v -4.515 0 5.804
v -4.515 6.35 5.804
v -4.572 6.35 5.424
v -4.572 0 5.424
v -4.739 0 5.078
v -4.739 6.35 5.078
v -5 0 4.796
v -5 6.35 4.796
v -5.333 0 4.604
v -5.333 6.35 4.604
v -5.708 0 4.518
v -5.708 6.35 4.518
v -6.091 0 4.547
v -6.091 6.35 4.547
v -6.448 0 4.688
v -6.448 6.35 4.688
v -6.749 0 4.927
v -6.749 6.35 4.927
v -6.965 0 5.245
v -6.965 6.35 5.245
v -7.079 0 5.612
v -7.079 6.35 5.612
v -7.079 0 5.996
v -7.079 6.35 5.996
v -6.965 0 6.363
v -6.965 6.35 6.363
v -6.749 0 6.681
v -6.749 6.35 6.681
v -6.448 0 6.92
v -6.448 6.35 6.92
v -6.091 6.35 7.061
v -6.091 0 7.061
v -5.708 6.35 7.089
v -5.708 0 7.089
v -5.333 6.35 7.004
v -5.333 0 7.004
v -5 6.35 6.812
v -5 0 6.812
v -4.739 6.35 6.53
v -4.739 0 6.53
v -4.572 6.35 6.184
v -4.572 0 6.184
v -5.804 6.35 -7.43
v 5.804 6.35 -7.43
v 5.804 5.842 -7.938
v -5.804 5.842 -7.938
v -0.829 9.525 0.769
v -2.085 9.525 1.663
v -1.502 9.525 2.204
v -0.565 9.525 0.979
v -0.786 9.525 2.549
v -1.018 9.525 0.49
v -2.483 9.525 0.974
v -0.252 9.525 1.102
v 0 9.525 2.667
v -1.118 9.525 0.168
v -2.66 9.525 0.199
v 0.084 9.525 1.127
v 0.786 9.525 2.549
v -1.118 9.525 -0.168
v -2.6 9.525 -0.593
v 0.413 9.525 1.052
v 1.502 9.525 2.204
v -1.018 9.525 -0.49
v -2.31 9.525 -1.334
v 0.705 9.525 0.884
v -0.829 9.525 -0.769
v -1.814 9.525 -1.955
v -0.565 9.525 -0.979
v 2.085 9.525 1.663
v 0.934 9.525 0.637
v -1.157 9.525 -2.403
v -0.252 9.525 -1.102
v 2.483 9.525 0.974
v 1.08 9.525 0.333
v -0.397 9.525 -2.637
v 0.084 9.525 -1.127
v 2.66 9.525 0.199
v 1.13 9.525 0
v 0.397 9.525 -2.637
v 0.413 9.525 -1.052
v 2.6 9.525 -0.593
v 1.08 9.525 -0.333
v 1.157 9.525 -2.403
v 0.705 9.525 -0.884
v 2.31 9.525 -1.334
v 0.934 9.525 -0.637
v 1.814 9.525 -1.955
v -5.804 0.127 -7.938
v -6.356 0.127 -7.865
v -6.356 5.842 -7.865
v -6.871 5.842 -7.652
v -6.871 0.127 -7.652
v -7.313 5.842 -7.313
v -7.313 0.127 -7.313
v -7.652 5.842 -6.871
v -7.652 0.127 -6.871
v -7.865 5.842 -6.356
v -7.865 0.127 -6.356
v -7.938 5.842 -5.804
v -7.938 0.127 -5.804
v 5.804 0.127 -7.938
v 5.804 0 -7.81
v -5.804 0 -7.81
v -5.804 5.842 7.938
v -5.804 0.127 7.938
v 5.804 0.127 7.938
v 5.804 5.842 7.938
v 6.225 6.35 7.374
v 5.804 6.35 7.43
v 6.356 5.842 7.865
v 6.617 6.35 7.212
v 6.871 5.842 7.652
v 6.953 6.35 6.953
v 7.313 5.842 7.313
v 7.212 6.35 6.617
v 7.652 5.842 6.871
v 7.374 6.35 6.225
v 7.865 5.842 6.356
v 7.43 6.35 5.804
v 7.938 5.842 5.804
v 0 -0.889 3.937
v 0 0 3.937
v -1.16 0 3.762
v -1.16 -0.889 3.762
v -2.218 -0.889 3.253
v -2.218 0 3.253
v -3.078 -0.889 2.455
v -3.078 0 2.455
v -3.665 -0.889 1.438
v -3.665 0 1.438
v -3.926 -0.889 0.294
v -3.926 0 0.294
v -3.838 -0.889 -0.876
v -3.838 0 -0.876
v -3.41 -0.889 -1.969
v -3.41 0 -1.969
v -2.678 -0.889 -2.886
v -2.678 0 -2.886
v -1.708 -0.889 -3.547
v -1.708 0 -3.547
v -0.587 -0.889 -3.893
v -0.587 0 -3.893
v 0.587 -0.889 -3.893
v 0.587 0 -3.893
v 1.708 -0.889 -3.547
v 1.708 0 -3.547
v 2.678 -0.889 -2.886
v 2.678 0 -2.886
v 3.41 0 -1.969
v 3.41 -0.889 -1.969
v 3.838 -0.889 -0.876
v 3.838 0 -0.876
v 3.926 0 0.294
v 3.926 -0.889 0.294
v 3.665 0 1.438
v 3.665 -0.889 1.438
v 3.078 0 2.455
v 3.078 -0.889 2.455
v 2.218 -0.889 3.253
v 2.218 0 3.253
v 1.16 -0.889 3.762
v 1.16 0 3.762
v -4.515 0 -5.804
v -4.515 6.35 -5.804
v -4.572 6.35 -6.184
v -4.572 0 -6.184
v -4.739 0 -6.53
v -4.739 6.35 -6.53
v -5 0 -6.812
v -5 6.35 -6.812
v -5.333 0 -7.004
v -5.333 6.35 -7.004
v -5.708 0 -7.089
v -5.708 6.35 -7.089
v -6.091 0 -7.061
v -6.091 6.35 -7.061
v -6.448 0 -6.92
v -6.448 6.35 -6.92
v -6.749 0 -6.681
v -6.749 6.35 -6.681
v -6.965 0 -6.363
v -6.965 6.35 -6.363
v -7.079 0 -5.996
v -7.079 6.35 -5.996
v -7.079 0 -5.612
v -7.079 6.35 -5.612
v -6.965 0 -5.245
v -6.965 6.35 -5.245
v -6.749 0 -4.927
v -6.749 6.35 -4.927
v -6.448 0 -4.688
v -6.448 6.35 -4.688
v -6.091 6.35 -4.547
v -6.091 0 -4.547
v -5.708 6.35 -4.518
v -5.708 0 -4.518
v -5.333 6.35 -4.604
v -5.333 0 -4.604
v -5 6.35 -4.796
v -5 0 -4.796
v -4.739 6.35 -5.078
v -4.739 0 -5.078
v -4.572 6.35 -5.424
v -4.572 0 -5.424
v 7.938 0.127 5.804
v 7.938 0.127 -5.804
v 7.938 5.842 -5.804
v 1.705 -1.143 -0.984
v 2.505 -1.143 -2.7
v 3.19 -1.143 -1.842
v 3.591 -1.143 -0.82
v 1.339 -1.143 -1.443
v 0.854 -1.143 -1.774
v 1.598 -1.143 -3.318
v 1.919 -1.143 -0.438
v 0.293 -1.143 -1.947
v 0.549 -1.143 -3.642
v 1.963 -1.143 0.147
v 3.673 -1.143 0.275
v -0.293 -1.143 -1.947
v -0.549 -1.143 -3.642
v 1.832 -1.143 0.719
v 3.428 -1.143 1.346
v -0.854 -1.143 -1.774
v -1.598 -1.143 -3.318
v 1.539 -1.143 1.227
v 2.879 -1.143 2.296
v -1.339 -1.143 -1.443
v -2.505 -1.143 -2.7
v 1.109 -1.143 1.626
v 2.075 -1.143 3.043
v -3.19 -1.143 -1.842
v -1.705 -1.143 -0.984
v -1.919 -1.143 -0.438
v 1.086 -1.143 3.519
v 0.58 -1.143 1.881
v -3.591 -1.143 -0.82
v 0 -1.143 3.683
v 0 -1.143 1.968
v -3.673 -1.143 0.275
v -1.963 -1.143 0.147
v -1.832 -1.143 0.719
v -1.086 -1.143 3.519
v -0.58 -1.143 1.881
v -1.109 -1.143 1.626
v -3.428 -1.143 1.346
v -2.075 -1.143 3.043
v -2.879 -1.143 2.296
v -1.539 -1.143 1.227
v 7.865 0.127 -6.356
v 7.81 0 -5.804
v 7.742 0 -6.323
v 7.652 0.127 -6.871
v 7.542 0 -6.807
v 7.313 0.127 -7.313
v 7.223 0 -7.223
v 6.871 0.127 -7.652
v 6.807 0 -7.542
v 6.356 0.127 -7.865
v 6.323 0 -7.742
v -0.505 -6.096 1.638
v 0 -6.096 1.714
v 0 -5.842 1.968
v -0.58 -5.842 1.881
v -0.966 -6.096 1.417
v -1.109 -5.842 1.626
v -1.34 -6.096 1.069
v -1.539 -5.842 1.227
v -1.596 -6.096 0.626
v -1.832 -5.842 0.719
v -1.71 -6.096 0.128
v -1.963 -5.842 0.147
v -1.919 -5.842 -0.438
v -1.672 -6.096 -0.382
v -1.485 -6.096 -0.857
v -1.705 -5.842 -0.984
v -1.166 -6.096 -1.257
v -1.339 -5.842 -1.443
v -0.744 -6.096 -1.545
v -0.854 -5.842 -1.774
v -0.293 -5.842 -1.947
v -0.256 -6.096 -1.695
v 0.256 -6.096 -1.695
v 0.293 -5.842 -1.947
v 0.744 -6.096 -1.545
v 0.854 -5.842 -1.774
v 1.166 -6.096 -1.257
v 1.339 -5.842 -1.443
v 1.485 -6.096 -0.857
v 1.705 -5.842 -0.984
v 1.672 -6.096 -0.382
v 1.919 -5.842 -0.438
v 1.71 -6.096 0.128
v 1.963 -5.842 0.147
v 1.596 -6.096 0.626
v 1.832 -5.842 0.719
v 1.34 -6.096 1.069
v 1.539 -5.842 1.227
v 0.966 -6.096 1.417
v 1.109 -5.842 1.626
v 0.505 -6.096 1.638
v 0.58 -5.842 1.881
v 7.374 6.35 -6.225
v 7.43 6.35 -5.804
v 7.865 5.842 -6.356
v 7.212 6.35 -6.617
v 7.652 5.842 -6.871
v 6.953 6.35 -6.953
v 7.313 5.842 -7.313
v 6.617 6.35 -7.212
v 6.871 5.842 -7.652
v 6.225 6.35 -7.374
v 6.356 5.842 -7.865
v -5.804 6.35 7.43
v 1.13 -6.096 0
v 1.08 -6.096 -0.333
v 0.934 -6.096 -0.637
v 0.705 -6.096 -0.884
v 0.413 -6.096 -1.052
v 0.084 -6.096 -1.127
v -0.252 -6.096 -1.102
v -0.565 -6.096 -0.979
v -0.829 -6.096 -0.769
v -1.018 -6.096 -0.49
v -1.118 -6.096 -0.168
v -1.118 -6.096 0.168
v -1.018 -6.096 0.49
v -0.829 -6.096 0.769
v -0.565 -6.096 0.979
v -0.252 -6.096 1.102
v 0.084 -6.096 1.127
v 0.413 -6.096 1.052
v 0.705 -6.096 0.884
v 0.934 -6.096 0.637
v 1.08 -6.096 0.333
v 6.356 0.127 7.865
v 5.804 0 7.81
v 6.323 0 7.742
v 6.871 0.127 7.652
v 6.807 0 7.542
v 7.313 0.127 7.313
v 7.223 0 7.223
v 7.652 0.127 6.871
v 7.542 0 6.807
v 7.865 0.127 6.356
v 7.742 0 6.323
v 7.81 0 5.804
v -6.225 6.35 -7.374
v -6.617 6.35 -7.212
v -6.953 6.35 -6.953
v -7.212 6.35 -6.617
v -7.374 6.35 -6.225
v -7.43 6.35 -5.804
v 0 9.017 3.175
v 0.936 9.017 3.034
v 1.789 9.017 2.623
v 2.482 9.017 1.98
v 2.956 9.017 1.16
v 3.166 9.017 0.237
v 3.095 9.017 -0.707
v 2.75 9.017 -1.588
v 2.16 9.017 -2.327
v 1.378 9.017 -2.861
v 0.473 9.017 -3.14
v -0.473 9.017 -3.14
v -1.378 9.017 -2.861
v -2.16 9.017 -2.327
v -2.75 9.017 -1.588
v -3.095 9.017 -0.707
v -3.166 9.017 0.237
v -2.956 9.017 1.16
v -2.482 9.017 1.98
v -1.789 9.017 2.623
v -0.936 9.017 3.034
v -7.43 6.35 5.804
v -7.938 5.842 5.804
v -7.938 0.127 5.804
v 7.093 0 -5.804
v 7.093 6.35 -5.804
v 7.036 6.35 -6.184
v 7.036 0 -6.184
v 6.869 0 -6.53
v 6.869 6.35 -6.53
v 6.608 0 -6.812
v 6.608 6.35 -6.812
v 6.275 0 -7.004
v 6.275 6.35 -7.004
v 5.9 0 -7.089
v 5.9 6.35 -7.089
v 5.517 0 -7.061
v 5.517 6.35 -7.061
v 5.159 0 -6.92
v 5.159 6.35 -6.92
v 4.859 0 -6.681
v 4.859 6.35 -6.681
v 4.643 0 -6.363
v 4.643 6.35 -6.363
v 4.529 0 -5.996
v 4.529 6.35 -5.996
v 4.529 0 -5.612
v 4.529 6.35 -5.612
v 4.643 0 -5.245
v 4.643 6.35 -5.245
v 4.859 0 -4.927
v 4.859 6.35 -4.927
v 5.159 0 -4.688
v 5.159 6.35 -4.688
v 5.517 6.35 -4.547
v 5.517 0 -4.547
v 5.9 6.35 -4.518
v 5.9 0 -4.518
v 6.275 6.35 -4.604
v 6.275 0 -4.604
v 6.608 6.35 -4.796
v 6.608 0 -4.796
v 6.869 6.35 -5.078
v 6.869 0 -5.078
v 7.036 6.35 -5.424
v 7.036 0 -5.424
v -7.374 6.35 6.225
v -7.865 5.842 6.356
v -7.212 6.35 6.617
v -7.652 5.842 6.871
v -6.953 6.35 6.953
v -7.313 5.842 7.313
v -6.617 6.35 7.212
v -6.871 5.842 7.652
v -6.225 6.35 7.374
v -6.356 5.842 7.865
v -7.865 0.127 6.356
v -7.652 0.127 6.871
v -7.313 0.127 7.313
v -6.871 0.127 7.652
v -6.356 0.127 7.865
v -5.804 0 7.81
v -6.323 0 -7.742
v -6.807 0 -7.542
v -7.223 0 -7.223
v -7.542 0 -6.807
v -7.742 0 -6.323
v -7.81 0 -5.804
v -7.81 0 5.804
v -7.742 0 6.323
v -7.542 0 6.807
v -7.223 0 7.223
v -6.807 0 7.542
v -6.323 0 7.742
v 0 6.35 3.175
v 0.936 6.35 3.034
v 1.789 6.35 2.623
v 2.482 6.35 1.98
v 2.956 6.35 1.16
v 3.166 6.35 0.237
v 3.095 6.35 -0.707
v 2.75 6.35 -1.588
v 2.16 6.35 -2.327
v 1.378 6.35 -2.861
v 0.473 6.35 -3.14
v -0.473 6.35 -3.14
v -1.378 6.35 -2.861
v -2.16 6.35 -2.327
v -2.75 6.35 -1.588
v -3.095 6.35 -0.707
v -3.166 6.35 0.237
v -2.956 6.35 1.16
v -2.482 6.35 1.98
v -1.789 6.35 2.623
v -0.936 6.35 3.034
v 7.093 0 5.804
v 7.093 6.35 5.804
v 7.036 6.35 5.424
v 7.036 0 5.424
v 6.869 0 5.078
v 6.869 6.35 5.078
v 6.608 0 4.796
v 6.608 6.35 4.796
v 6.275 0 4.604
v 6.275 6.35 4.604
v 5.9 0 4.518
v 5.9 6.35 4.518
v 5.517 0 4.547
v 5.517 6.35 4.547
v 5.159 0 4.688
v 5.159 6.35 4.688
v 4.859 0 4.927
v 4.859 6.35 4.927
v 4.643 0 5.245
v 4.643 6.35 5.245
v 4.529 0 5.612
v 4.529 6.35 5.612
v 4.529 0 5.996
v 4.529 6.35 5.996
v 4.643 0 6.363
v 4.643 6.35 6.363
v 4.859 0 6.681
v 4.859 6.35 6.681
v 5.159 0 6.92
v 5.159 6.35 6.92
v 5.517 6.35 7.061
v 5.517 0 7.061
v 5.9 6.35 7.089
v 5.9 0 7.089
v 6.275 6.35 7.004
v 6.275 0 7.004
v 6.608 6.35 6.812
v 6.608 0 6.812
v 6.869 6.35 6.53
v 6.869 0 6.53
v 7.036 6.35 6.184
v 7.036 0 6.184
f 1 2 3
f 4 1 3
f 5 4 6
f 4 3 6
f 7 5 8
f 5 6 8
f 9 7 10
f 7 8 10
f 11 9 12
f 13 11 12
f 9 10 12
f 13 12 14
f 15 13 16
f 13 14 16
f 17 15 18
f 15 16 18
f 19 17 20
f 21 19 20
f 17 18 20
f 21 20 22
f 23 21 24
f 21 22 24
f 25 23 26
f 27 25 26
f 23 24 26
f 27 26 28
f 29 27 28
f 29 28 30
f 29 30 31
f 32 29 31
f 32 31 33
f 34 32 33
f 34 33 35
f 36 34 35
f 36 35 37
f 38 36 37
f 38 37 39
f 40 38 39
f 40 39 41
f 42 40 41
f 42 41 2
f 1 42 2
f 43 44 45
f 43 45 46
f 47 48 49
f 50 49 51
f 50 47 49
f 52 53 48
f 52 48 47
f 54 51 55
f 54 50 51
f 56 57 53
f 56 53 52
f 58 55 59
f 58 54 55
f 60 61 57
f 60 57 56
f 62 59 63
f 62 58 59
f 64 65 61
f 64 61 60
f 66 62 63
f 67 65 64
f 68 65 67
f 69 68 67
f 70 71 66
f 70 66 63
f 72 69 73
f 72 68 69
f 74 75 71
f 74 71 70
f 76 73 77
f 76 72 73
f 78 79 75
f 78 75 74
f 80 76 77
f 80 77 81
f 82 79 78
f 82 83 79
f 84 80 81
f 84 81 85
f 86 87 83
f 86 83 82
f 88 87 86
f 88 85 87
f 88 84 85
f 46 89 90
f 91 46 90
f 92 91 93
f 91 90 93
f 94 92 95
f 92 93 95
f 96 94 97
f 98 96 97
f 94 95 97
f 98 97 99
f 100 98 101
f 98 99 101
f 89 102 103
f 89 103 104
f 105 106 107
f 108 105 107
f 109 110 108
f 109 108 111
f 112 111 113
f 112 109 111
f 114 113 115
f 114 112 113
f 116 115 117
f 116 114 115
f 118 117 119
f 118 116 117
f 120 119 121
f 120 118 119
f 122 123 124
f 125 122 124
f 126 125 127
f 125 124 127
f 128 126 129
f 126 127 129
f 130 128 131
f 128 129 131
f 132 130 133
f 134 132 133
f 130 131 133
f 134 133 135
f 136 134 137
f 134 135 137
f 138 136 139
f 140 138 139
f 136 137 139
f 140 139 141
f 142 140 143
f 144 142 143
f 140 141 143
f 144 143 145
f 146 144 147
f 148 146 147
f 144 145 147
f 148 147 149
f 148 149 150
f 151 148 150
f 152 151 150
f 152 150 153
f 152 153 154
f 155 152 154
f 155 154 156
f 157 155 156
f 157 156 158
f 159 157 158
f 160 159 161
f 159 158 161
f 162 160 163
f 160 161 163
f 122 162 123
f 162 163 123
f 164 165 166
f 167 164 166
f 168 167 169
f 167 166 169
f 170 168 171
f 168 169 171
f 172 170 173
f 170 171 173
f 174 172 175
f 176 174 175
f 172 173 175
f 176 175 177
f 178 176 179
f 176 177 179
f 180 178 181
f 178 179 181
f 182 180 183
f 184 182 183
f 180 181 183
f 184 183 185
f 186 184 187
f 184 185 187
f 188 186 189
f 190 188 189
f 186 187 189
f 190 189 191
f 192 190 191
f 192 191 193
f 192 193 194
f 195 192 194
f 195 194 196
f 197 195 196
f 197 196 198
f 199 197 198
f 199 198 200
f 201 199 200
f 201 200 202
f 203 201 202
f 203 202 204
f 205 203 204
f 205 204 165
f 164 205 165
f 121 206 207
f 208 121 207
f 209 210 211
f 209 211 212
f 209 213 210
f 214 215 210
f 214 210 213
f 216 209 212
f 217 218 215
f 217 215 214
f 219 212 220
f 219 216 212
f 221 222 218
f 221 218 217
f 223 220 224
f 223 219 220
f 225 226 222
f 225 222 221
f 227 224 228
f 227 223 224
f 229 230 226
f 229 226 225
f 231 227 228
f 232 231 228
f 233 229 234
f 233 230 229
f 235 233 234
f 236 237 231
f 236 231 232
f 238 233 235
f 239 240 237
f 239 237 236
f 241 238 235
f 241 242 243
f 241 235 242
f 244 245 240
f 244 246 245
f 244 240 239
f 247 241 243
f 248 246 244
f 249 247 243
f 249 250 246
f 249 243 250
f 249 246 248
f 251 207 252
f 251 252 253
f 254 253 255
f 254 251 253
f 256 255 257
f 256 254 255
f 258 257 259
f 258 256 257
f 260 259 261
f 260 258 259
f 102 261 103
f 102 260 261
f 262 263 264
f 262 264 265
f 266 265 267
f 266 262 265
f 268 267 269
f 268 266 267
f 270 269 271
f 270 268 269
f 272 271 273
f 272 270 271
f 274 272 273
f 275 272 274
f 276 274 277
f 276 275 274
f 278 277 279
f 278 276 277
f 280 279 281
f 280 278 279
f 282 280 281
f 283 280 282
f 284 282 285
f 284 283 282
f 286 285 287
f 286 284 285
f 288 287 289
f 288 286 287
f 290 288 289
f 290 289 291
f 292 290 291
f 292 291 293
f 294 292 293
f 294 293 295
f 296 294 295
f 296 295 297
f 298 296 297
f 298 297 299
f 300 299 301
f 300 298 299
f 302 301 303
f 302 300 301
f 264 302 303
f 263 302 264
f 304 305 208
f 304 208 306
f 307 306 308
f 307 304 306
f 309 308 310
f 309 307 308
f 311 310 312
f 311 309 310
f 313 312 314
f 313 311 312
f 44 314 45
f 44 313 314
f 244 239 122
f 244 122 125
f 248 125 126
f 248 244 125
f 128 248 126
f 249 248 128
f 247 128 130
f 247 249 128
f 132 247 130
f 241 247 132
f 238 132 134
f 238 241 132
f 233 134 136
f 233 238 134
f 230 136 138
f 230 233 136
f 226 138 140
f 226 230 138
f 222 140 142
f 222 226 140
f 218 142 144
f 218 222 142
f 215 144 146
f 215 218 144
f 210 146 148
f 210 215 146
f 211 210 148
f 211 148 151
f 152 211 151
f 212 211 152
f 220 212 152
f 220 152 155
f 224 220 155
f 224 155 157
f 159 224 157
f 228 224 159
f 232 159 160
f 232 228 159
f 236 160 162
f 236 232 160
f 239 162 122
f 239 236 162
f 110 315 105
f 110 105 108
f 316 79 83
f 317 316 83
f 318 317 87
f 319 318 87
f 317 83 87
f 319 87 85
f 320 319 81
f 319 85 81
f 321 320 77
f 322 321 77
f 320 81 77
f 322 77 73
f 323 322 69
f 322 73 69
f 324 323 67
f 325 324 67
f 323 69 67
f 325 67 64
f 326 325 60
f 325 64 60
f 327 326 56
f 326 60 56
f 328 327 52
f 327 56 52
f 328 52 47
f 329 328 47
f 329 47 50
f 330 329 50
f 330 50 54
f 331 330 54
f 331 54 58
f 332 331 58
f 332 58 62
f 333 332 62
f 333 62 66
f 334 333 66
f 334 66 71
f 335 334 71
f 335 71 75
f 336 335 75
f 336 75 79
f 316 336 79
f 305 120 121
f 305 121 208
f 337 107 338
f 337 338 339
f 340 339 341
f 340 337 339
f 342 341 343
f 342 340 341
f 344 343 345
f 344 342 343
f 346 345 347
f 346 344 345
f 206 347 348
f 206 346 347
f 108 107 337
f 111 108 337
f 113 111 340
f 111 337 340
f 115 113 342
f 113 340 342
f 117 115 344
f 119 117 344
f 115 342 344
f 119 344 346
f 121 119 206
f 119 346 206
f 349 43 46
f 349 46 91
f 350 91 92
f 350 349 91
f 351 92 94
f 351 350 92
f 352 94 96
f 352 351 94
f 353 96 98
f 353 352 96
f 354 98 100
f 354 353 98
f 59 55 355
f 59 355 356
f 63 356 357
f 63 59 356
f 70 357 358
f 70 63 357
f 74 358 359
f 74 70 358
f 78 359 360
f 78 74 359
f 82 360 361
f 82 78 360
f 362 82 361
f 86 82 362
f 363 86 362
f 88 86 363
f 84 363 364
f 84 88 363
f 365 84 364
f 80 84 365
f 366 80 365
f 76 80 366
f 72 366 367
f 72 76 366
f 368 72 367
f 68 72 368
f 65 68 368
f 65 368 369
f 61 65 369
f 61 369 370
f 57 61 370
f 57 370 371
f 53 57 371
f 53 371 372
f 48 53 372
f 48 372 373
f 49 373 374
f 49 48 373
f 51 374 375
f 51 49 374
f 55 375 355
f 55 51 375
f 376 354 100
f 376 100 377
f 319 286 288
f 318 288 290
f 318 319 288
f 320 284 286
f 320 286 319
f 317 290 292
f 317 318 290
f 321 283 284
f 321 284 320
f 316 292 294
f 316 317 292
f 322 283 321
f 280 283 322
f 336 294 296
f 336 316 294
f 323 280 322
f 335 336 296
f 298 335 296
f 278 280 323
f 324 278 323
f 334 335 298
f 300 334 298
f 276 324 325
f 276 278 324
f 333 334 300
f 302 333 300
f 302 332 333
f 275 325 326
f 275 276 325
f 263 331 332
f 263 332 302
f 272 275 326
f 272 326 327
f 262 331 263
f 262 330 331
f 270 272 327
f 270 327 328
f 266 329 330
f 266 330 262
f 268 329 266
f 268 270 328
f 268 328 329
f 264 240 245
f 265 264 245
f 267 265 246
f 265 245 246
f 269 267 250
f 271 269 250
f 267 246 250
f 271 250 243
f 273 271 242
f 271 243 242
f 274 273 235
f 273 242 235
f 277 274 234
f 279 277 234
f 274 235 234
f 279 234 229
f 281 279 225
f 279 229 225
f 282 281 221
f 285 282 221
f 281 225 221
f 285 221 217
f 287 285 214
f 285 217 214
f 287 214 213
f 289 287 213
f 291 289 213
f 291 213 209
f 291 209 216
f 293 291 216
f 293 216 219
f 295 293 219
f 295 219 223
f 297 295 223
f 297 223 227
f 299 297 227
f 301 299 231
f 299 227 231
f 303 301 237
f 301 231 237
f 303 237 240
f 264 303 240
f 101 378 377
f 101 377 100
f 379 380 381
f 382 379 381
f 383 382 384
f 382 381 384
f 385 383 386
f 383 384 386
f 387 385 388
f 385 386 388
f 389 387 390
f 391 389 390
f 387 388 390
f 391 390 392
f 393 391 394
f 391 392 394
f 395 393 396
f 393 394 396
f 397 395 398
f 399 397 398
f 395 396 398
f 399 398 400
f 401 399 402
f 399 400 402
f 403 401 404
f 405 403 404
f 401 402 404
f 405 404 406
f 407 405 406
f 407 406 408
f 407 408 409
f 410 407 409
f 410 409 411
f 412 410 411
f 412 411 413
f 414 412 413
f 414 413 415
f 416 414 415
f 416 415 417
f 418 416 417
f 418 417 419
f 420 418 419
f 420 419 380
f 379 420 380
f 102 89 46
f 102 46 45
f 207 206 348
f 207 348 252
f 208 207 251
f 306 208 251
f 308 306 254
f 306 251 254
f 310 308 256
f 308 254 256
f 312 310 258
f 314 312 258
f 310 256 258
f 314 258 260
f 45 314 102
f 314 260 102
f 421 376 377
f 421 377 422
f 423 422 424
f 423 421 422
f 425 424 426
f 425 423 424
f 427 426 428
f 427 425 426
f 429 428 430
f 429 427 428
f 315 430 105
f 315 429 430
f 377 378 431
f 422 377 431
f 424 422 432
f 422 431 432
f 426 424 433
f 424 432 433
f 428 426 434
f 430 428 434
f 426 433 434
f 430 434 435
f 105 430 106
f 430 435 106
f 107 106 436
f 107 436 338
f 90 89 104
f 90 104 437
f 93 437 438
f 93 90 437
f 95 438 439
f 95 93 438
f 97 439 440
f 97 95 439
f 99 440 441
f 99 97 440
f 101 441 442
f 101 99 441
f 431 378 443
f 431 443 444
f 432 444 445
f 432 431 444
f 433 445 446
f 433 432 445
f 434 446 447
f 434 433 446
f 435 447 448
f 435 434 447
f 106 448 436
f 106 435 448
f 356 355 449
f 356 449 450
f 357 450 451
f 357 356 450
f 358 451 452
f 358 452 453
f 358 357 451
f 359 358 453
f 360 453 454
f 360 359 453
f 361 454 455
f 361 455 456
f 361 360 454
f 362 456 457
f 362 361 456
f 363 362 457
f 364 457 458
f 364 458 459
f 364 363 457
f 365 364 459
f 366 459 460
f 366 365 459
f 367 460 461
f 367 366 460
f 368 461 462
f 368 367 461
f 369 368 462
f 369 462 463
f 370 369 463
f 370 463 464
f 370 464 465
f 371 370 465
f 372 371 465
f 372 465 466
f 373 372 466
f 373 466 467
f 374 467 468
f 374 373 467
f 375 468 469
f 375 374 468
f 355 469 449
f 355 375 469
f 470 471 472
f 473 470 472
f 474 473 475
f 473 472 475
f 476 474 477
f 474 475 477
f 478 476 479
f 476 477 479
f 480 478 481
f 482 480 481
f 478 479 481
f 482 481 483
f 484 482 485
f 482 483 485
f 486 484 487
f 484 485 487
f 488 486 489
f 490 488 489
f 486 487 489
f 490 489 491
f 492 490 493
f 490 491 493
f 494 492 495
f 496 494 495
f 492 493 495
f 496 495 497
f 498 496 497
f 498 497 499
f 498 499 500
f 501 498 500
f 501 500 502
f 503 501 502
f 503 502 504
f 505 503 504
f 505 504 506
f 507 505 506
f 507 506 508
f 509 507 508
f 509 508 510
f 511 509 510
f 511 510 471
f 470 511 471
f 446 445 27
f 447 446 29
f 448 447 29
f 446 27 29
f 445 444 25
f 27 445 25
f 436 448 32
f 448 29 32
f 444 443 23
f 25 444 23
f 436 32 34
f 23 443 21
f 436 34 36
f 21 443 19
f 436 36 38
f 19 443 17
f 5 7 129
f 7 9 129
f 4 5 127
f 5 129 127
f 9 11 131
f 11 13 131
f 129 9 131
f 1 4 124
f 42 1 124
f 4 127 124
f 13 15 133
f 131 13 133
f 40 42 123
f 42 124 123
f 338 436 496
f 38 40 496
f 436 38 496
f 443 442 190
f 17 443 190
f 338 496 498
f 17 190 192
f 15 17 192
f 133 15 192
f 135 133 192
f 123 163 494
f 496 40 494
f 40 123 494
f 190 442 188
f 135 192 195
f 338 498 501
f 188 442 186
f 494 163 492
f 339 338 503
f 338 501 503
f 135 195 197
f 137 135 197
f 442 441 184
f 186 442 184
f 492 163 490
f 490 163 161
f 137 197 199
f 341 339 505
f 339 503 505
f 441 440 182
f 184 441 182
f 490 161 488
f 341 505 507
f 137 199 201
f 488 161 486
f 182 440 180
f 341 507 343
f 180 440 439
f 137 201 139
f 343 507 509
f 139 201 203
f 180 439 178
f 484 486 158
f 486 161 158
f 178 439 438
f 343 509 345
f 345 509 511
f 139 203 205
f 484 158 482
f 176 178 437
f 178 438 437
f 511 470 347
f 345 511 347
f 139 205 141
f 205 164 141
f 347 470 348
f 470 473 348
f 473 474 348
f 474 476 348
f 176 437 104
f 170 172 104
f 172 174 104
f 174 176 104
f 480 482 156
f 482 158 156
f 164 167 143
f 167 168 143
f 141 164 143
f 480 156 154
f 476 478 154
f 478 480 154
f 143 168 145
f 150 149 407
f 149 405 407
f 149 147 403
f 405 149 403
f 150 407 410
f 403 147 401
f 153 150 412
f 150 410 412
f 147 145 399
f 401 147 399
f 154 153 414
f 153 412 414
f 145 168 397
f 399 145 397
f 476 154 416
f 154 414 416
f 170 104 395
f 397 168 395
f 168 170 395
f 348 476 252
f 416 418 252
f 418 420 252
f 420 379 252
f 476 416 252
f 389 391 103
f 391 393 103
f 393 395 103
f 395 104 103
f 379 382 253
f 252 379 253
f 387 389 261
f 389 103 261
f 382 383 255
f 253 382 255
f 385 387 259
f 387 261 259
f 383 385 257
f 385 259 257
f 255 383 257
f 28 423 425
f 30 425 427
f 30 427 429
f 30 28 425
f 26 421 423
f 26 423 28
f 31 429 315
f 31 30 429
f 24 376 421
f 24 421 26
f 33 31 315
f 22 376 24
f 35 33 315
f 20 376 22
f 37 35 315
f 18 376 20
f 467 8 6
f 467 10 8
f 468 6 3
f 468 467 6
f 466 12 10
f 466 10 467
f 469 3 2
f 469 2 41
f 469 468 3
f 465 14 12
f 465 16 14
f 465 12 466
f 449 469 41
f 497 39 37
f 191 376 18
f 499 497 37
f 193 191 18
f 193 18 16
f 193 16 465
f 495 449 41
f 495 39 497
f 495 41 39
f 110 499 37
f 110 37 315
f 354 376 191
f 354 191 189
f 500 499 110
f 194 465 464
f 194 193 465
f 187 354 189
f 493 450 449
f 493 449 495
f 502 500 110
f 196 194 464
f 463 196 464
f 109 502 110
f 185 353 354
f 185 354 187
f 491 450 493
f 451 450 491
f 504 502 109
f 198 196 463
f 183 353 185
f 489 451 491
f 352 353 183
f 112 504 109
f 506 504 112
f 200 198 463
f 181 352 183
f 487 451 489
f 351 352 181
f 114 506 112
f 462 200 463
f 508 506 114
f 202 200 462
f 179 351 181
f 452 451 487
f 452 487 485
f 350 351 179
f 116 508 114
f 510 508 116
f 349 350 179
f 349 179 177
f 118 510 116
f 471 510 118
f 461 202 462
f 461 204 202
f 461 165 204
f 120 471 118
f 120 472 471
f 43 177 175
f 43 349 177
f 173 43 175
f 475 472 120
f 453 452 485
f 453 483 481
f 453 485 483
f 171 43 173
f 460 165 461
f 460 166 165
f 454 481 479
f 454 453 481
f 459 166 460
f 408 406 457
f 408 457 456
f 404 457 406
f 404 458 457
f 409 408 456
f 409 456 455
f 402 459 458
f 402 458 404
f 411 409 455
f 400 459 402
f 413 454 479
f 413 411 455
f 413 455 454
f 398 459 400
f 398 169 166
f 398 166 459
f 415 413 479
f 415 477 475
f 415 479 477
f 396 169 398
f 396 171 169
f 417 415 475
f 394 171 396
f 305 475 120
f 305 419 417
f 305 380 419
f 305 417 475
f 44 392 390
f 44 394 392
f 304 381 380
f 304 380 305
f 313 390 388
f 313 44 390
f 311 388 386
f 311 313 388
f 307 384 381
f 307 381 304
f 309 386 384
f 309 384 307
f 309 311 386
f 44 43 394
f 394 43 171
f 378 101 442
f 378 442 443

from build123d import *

# Parameters (mm, degrees)
SKETCH1_W             = 15.875
SKETCH1_H             = 15.875
BOSS_EXTRUDE1_DEPTH   = 9.525
F_5_40_TAPPED_HOLE1_D = 2.5781
SKETCH4_R             = 3.937
BOSS_EXTRUDE2_DEPTH   = 1.143
SKETCH10_R            = 1.9685
BOSS_EXTRUDE4_DEPTH   = 4.953
F_4_40_TAPPED_HOLE1_D = 2.2606
SKETCH9_OUTSIDE_W     = 23.345
SKETCH9_OUTSIDE_H     = 23.345
SKETCH9_OUTSIDE_R     = 3.175
CUT_EXTRUDE3_DEPTH    = 3.175
SKETCH11_OUTSIDE_W    = 23.345
SKETCH11_OUTSIDE_H    = 23.345
CUT_EXTRUDE4_DEPTH    = 15.721869362
CHAMFER1_SIZE         = 0.254
CHAMFER3_SIZE         = 0.508
CHAMFER4_SIZE         = 0.127


with BuildPart() as part:
    # Sketch1 → Boss-Extrude1 (new body)
    with BuildSketch(Plane(origin=(0, 0, 0), x_dir=(1, 0, 0), z_dir=(0, 1, 0))):
        Rectangle(SKETCH1_W, SKETCH1_H)
    extrude(amount=BOSS_EXTRUDE1_DEPTH)

    # #5-40 Tapped Hole1 (through all)
    with Locations(Plane(origin=(0, 0, 0), x_dir=(-1, 0, 0), z_dir=(0, -1, 0))):
        with Locations((-5.8039, -5.8039), (-5.8039, 5.8039), (5.8039, 5.8039), (5.8039, -5.8039)):
            Hole(F_5_40_TAPPED_HOLE1_D / 2)

    # Sketch4 → Boss-Extrude2 (add)
    with BuildSketch(Plane.XZ):
        with Locations(Location((0, 0, 0), (0, 0, 90))):
            Circle(SKETCH4_R)
    extrude(amount=BOSS_EXTRUDE2_DEPTH)

    # Sketch10 → Boss-Extrude4 (add)
    with BuildSketch(Plane.XZ.offset(1.143)):
        with Locations(Location((0, 0, 0), (0, 0, 90))):
            Circle(SKETCH10_R)
    extrude(amount=BOSS_EXTRUDE4_DEPTH)

    # #4-40 Tapped Hole1 (through all)
    with Locations(Plane(origin=(0, -6.096, 0), x_dir=(-1, 0, 0), z_dir=(0, -1, 0))):
        with Locations((0, 0)):
            Hole(F_4_40_TAPPED_HOLE1_D / 2)

    # Sketch9 outside → Cut-Extrude3 (cut)
    with BuildSketch(Plane(origin=(0, 9.525, 0), x_dir=(1, 0, 0), z_dir=(0, 1, 0))):
        with Locations((-0.0005, -0.0005)):
            Rectangle(SKETCH9_OUTSIDE_W, SKETCH9_OUTSIDE_H)
        with Locations(Location((0, 0, 0), (0, 0, 270))):
            Circle(SKETCH9_OUTSIDE_R, mode=Mode.SUBTRACT)
    extrude(amount=-CUT_EXTRUDE3_DEPTH, mode=Mode.SUBTRACT)

    # Sketch11 outside → Cut-Extrude4 (cut, through all)
    with BuildSketch(Plane.XZ):
        with Locations((-0.0005, 0.0005)):
            Rectangle(SKETCH11_OUTSIDE_W, SKETCH11_OUTSIDE_H)
        with BuildLine():
            Line((-5.8039, 7.9375), (5.8039, 7.9375))
            ThreePointArc((5.8039, 7.9375), (7.312583028, 7.312583028), (7.9375, 5.8039))
            Line((7.9375, 5.8039), (7.9375, -5.8039))
            ThreePointArc((7.9375, -5.8039), (7.312583028, -7.312583028), (5.8039, -7.9375))
            Line((5.8039, -7.9375), (-5.8039, -7.9375))
            ThreePointArc((-5.8039, -7.9375), (-7.312583028, -7.312583028), (-7.9375, -5.8039))
            Line((-7.9375, -5.8039), (-7.9375, 5.8039))
            ThreePointArc((-7.9375, 5.8039), (-7.312583028, 7.312583028), (-5.8039, 7.9375))
        make_face(mode=Mode.SUBTRACT)
    extrude(amount=-CUT_EXTRUDE4_DEPTH, mode=Mode.SUBTRACT)

    # Chamfer1
    chamfer1_edges = [part.edges().sort_by_distance(p)[0] for p in [
        (0, -1.143, -3.937),
        (0, -6.096, -1.9685),
    ]]
    chamfer(chamfer1_edges, length=CHAMFER1_SIZE)

    # Chamfer3
    chamfer3_edges = [part.edges().sort_by_distance(p)[0] for p in [
        (0, 9.525, -3.175),
        (7.9375, 6.35, 0),
        (0, 6.35, -7.9375),
        (-7.9375, 6.35, 0),
        (0, 6.35, 7.9375),
        (-7.312583028, 6.35, -7.312583028),
        (7.312583028, 6.35, -7.312583028),
        (7.312583028, 6.35, 7.312583028),
        (-7.312583028, 6.35, 7.312583028),
    ]]
    chamfer(chamfer3_edges, length=CHAMFER3_SIZE)

    # Chamfer4
    chamfer4_edges = [part.edges().sort_by_distance(p)[0] for p in [
        (-7.312583028, 0, 7.312583028),
        (7.312583028, 0, 7.312583028),
        (7.312583028, 0, -7.312583028),
        (-7.312583028, 0, -7.312583028),
        (7.9375, 0, 0),
        (0, 0, 7.9375),
        (-7.9375, 0, 0),
        (0, 0, -7.9375),
    ]]
    chamfer(chamfer4_edges, length=CHAMFER4_SIZE)


solid = part.part
